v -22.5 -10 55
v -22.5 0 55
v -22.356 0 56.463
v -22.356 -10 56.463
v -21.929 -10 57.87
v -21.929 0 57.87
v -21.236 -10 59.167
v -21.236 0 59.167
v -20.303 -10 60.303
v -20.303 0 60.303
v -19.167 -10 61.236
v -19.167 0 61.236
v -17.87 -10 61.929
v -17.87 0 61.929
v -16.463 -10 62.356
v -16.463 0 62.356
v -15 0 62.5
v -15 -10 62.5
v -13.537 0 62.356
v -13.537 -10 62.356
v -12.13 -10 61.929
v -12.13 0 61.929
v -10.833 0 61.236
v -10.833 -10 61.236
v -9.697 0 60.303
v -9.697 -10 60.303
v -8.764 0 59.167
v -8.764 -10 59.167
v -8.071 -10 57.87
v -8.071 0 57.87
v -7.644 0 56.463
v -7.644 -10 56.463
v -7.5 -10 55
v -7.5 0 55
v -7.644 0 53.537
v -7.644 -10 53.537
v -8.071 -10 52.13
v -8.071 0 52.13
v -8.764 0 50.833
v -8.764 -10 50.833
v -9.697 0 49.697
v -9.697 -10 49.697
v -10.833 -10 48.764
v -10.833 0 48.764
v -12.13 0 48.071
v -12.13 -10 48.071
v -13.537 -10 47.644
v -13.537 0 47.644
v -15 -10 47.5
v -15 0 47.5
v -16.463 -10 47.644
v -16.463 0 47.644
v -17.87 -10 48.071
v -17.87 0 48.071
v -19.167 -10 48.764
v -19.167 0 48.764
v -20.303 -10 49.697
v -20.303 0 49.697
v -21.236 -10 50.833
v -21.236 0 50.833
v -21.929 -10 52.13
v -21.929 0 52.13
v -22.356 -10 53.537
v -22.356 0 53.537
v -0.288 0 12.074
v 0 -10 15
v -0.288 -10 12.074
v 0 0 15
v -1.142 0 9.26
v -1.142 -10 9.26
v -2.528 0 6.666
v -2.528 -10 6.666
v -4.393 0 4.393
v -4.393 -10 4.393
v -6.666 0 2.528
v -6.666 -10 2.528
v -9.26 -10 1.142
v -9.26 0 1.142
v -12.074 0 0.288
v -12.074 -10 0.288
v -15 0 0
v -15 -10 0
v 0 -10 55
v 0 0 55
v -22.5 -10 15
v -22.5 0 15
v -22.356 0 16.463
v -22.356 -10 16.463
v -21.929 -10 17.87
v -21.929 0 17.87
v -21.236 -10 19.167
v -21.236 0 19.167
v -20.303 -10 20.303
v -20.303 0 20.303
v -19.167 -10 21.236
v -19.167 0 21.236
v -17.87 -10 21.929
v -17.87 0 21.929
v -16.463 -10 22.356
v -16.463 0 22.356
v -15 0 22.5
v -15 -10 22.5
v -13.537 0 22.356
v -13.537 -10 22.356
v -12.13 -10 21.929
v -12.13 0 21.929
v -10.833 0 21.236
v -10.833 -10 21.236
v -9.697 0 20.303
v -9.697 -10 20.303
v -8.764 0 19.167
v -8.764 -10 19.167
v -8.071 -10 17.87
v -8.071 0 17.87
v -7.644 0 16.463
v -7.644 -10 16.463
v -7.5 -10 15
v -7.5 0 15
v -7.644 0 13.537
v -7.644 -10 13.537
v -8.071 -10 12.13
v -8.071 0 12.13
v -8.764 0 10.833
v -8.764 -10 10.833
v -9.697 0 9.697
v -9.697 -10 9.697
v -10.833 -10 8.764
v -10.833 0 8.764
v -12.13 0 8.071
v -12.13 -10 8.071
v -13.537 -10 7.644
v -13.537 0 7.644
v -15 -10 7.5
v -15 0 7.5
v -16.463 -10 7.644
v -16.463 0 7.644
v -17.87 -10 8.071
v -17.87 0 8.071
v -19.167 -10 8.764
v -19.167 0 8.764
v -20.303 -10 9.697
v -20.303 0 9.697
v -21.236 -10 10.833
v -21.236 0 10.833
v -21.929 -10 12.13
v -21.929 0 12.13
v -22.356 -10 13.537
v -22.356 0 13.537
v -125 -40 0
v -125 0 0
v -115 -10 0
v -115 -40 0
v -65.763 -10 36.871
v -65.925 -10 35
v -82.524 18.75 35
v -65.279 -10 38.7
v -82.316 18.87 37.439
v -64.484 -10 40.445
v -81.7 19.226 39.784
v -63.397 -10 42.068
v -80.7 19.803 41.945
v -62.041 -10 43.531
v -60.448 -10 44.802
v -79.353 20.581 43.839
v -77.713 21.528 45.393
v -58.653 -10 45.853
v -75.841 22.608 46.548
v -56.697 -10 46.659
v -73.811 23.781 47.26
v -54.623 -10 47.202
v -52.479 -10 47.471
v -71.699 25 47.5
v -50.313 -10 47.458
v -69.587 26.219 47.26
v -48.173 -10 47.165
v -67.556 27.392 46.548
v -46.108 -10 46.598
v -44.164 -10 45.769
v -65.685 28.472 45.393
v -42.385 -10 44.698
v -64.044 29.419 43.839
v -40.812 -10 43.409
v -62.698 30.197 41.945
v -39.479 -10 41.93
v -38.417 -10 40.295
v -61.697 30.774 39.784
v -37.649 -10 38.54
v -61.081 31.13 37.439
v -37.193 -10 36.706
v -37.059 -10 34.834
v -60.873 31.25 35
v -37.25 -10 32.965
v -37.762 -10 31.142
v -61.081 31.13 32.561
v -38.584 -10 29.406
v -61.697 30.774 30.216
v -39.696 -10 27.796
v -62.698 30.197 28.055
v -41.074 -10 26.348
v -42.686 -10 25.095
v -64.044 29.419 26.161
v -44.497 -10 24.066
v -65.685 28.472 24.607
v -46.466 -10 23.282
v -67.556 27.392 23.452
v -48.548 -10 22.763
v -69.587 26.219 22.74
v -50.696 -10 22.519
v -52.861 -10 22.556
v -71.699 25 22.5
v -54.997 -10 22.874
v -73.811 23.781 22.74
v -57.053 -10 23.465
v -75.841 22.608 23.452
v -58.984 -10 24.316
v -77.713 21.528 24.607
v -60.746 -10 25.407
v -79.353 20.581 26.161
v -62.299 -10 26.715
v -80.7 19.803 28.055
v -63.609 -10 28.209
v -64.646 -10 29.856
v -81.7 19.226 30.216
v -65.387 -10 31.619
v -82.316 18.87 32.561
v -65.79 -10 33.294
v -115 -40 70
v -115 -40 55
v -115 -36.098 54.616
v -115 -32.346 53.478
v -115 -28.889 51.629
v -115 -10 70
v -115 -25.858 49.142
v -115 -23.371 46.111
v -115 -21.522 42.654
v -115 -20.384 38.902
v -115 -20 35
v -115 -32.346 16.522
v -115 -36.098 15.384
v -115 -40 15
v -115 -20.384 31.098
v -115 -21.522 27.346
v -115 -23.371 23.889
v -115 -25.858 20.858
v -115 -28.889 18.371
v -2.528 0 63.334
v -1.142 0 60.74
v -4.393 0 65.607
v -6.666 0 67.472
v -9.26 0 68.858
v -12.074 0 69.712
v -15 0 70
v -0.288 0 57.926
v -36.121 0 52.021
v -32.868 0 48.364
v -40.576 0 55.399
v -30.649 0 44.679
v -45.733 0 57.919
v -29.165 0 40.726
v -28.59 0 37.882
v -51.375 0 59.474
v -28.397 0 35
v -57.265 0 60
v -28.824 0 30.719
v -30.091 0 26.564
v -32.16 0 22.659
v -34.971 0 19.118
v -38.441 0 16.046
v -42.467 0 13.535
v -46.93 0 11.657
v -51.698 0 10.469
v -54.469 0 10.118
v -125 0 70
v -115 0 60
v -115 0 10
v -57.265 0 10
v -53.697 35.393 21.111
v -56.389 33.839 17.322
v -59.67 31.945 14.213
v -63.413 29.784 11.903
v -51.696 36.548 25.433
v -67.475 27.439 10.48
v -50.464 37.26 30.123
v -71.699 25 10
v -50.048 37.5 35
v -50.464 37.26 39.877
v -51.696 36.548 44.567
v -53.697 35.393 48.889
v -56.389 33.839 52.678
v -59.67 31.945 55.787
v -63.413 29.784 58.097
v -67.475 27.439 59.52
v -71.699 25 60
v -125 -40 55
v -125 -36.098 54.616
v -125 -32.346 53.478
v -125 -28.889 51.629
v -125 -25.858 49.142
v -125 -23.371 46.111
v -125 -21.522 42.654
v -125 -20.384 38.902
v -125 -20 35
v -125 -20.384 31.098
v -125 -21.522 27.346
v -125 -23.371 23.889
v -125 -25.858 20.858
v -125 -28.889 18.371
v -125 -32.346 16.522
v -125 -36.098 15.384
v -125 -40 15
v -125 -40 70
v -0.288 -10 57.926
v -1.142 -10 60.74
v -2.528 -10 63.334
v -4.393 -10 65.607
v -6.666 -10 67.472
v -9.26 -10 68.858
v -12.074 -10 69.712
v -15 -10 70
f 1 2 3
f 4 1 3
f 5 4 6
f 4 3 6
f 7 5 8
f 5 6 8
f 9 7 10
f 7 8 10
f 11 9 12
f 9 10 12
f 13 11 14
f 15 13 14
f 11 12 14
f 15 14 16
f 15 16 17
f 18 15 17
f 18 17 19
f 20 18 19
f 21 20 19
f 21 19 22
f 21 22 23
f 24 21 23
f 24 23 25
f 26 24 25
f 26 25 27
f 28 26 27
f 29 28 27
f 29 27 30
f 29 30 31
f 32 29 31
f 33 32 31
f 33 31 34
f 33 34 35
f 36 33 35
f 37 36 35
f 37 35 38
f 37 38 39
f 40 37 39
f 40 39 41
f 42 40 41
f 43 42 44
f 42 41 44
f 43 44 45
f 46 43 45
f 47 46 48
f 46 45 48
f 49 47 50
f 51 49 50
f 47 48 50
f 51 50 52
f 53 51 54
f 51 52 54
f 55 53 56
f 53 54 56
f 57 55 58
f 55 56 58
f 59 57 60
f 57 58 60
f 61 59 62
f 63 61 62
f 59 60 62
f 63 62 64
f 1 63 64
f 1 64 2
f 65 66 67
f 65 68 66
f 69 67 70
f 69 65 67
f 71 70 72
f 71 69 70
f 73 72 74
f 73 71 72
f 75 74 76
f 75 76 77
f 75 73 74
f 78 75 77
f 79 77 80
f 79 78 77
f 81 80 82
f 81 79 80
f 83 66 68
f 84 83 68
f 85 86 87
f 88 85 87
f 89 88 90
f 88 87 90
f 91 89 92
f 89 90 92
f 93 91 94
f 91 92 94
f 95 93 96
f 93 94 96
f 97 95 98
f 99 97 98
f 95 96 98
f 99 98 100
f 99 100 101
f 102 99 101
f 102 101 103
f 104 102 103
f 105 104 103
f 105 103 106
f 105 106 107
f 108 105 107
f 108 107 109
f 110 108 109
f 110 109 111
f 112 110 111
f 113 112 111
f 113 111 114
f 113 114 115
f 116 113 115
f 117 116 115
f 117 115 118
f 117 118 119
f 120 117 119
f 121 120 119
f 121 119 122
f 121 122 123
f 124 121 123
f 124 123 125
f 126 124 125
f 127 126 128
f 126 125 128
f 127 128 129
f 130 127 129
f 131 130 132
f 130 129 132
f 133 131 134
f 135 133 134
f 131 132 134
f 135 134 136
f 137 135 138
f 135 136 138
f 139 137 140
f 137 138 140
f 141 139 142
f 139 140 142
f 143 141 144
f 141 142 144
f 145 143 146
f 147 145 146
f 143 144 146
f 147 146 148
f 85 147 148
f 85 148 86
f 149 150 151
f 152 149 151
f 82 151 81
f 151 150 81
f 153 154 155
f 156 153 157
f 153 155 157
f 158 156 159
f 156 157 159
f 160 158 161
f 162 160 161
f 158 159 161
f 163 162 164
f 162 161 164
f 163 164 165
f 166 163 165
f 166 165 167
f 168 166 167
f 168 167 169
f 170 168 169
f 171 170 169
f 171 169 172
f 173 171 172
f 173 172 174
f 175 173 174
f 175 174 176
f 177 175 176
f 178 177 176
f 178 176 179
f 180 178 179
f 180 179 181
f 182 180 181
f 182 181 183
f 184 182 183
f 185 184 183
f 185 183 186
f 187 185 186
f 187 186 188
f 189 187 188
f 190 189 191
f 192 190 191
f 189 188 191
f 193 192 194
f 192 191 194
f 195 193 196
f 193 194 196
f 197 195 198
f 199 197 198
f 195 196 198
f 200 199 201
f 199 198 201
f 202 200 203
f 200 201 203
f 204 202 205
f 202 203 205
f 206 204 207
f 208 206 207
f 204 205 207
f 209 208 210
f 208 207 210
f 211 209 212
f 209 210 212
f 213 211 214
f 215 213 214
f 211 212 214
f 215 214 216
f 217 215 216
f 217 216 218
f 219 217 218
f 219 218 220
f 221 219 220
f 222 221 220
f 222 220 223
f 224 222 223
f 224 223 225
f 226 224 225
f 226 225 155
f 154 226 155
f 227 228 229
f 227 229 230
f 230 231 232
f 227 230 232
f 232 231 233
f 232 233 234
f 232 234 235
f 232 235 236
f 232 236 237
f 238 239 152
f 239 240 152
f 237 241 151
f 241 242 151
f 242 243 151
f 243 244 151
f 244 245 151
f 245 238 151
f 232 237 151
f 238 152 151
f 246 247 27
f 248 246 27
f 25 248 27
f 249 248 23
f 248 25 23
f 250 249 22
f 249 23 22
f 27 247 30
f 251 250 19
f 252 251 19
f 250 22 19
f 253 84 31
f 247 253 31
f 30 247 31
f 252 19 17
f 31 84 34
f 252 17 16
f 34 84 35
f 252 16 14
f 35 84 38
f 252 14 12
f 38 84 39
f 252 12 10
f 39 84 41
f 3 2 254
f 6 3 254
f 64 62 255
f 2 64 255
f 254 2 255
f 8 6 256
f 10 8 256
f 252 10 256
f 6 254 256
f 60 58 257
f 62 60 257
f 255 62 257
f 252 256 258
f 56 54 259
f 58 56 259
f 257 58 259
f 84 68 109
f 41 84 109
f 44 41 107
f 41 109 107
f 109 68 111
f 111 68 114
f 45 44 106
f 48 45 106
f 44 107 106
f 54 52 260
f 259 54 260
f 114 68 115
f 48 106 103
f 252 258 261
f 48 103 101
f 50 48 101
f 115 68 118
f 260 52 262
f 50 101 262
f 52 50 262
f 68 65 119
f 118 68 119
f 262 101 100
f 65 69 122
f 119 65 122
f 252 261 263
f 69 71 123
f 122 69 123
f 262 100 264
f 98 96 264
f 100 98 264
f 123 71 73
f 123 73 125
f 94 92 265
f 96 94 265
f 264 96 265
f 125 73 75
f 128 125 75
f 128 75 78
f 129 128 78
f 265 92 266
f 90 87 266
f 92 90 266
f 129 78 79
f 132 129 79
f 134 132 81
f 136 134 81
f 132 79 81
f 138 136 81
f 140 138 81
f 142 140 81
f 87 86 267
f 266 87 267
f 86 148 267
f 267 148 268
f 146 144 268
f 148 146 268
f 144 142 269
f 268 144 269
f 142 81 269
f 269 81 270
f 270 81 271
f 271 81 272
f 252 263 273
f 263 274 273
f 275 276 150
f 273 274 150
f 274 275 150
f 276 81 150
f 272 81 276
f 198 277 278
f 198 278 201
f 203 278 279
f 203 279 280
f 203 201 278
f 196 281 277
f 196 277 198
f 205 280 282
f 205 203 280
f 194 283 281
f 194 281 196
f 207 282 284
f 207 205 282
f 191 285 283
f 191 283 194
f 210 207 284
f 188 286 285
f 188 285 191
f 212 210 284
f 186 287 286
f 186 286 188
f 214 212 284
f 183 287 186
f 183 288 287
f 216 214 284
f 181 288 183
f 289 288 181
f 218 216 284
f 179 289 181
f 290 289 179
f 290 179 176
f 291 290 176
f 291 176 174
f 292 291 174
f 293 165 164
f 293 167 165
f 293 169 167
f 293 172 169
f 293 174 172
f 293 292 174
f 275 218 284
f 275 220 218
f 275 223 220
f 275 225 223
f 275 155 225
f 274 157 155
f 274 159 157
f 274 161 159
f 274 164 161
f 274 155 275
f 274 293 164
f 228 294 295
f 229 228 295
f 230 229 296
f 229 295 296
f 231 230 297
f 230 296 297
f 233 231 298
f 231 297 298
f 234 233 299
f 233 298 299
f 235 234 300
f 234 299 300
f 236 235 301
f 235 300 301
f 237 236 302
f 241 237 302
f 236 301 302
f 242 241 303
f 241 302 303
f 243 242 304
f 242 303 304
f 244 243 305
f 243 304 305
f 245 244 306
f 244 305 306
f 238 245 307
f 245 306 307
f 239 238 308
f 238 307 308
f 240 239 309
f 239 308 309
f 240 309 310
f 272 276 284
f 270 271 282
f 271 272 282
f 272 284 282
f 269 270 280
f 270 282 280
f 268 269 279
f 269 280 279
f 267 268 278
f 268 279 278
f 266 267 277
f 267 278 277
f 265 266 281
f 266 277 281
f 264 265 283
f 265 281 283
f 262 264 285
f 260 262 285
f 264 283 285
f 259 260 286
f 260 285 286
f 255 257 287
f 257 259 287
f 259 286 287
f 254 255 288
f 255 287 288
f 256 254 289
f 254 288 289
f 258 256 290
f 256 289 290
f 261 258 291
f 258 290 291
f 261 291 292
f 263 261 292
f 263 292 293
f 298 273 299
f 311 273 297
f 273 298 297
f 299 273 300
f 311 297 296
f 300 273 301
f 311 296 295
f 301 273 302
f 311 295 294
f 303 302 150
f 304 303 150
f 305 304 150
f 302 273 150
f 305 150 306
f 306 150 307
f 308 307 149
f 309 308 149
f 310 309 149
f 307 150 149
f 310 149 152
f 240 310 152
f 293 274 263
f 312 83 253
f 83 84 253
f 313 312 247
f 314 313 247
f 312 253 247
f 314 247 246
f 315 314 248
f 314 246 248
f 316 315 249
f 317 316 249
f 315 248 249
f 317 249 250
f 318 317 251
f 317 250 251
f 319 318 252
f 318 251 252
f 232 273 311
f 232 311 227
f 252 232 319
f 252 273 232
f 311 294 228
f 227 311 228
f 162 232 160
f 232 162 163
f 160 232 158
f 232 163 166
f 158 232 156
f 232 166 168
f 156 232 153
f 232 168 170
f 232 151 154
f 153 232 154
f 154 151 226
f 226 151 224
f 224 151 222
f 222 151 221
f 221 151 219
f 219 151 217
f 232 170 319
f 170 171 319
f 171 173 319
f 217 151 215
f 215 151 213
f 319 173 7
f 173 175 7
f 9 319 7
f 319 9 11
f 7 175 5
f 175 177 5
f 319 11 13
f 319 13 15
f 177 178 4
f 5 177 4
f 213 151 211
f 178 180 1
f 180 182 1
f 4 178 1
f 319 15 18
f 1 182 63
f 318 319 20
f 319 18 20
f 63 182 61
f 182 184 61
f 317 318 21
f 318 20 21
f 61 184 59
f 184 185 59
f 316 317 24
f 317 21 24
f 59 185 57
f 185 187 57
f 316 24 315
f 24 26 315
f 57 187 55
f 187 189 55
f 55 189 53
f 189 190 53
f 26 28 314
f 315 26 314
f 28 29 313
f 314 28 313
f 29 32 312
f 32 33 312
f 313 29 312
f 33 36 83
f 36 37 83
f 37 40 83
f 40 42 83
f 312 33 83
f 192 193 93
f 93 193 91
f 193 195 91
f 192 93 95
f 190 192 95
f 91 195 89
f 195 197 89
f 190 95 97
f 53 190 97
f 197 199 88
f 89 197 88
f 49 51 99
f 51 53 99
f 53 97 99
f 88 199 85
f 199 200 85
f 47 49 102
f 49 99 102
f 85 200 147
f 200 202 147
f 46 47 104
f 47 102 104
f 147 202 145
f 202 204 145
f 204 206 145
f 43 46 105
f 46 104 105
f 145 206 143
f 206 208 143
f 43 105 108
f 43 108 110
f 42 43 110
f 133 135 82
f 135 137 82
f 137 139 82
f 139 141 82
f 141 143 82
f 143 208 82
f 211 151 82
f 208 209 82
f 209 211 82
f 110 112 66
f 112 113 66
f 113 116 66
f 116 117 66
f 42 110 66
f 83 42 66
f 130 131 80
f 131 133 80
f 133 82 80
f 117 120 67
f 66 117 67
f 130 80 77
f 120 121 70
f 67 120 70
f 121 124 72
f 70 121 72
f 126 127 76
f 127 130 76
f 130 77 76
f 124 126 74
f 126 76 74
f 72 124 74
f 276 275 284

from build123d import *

# Parameters (mm, degrees)
F1_DEPTH  = 70
F4_DEPTH  = 50
F6_REACH  = 161.8626818177
F7_R      = 12.5
F8_DEPTH  = 92.1420161514
F9_R      = 15
F10_R     = 7.5
F11_DEPTH = 25
F12_R     = 20
F13_DEPTH = 25


with BuildPart() as f1:
    # F0 (on Top) → F1 (new body)
    with BuildSketch(Plane.XY):
        Polygon((0, -10), (0, 0), (-125, 0), (-125, -40), (-115, -40), (-115, -10), align=None)
    extrude(amount=F1_DEPTH)

    # F3 (on offset) → F4 (join)
    with BuildSketch(Plane.XY.offset(60)):
        Polygon((-115, 0), (-28.3974596216, 0), (-50.0480947162, 37.5), align=None)
    extrude(amount=-F4_DEPTH)

    f6_end = Plane(origin=(-53.4880513164, 0, 35), x_dir=(0, 0, 1), z_dir=(0, 1, 0))
    # F5 (on face) → F6 (cut, up to a plane its end follows)
    with BuildSketch(Plane(origin=(-28.75, 49.7964607176, 0), x_dir=(-0.8660254038, -0.5, 0), z_dir=(-0.5, 0.8660254038, 0))):
        with BuildLine():
            ThreePointArc((49.5929214352, 10), (24.5929214352, 35), (49.5929214352, 60))
            Line((49.5929214352, 60), (49.5929214352, 65.1633962989))
            Line((49.5929214352, 65.1633962989), (18.7135729939, 65.1633962989))
            Line((18.7135729939, 65.1633962989), (18.7135729939, 2.6539005339))
            Line((18.7135729939, 2.6539005339), (49.5929214352, 2.6539005339))
            Line((49.5929214352, 2.6539005339), (49.5929214352, 10))
        make_face()
    f6_long = extrude(amount=-F6_REACH, mode=Mode.PRIVATE)
    add(split(f6_long, bisect_by=f6_end, keep=Keep.TOP, mode=Mode.PRIVATE), mode=Mode.SUBTRACT)

    # F7 (on face) → F8 (cut, through all)
    with BuildSketch(Plane(origin=(-28.75, 49.7964607176, 0), x_dir=(-0.8660254038, -0.5, 0), z_dir=(-0.5, 0.8660254038, 0))):
        with Locations((49.5929214352, 35)):
            Circle(F7_R)
    extrude(amount=-F8_DEPTH, mode=Mode.SUBTRACT)

    # F9
    f9_edges = [f1.edges().sort_by_distance(p)[0] for p in [
        (0, -5, 70),
        (0, -5, 0),
    ]]
    fillet(f9_edges, radius=F9_R)

    # F10 (on face) → F11 (cut)
    with BuildSketch(Plane(origin=(0, 0, 0), x_dir=(-1, 0, 0), z_dir=(0, 1, 0))):
        with Locations((15, 15)):
            Circle(F10_R)
        with Locations((15, 55)):
            Circle(F10_R)
    extrude(amount=-F11_DEPTH, mode=Mode.SUBTRACT)

    # F12 (on face) → F13 (cut)
    with BuildSketch(Plane(origin=(-125, 0, 0), x_dir=(0, -1, 0), z_dir=(-1, 0, 0))):
        with Locations((40, 35)):
            Circle(F12_R)
    extrude(amount=-F13_DEPTH, mode=Mode.SUBTRACT)


solid = f1.part
